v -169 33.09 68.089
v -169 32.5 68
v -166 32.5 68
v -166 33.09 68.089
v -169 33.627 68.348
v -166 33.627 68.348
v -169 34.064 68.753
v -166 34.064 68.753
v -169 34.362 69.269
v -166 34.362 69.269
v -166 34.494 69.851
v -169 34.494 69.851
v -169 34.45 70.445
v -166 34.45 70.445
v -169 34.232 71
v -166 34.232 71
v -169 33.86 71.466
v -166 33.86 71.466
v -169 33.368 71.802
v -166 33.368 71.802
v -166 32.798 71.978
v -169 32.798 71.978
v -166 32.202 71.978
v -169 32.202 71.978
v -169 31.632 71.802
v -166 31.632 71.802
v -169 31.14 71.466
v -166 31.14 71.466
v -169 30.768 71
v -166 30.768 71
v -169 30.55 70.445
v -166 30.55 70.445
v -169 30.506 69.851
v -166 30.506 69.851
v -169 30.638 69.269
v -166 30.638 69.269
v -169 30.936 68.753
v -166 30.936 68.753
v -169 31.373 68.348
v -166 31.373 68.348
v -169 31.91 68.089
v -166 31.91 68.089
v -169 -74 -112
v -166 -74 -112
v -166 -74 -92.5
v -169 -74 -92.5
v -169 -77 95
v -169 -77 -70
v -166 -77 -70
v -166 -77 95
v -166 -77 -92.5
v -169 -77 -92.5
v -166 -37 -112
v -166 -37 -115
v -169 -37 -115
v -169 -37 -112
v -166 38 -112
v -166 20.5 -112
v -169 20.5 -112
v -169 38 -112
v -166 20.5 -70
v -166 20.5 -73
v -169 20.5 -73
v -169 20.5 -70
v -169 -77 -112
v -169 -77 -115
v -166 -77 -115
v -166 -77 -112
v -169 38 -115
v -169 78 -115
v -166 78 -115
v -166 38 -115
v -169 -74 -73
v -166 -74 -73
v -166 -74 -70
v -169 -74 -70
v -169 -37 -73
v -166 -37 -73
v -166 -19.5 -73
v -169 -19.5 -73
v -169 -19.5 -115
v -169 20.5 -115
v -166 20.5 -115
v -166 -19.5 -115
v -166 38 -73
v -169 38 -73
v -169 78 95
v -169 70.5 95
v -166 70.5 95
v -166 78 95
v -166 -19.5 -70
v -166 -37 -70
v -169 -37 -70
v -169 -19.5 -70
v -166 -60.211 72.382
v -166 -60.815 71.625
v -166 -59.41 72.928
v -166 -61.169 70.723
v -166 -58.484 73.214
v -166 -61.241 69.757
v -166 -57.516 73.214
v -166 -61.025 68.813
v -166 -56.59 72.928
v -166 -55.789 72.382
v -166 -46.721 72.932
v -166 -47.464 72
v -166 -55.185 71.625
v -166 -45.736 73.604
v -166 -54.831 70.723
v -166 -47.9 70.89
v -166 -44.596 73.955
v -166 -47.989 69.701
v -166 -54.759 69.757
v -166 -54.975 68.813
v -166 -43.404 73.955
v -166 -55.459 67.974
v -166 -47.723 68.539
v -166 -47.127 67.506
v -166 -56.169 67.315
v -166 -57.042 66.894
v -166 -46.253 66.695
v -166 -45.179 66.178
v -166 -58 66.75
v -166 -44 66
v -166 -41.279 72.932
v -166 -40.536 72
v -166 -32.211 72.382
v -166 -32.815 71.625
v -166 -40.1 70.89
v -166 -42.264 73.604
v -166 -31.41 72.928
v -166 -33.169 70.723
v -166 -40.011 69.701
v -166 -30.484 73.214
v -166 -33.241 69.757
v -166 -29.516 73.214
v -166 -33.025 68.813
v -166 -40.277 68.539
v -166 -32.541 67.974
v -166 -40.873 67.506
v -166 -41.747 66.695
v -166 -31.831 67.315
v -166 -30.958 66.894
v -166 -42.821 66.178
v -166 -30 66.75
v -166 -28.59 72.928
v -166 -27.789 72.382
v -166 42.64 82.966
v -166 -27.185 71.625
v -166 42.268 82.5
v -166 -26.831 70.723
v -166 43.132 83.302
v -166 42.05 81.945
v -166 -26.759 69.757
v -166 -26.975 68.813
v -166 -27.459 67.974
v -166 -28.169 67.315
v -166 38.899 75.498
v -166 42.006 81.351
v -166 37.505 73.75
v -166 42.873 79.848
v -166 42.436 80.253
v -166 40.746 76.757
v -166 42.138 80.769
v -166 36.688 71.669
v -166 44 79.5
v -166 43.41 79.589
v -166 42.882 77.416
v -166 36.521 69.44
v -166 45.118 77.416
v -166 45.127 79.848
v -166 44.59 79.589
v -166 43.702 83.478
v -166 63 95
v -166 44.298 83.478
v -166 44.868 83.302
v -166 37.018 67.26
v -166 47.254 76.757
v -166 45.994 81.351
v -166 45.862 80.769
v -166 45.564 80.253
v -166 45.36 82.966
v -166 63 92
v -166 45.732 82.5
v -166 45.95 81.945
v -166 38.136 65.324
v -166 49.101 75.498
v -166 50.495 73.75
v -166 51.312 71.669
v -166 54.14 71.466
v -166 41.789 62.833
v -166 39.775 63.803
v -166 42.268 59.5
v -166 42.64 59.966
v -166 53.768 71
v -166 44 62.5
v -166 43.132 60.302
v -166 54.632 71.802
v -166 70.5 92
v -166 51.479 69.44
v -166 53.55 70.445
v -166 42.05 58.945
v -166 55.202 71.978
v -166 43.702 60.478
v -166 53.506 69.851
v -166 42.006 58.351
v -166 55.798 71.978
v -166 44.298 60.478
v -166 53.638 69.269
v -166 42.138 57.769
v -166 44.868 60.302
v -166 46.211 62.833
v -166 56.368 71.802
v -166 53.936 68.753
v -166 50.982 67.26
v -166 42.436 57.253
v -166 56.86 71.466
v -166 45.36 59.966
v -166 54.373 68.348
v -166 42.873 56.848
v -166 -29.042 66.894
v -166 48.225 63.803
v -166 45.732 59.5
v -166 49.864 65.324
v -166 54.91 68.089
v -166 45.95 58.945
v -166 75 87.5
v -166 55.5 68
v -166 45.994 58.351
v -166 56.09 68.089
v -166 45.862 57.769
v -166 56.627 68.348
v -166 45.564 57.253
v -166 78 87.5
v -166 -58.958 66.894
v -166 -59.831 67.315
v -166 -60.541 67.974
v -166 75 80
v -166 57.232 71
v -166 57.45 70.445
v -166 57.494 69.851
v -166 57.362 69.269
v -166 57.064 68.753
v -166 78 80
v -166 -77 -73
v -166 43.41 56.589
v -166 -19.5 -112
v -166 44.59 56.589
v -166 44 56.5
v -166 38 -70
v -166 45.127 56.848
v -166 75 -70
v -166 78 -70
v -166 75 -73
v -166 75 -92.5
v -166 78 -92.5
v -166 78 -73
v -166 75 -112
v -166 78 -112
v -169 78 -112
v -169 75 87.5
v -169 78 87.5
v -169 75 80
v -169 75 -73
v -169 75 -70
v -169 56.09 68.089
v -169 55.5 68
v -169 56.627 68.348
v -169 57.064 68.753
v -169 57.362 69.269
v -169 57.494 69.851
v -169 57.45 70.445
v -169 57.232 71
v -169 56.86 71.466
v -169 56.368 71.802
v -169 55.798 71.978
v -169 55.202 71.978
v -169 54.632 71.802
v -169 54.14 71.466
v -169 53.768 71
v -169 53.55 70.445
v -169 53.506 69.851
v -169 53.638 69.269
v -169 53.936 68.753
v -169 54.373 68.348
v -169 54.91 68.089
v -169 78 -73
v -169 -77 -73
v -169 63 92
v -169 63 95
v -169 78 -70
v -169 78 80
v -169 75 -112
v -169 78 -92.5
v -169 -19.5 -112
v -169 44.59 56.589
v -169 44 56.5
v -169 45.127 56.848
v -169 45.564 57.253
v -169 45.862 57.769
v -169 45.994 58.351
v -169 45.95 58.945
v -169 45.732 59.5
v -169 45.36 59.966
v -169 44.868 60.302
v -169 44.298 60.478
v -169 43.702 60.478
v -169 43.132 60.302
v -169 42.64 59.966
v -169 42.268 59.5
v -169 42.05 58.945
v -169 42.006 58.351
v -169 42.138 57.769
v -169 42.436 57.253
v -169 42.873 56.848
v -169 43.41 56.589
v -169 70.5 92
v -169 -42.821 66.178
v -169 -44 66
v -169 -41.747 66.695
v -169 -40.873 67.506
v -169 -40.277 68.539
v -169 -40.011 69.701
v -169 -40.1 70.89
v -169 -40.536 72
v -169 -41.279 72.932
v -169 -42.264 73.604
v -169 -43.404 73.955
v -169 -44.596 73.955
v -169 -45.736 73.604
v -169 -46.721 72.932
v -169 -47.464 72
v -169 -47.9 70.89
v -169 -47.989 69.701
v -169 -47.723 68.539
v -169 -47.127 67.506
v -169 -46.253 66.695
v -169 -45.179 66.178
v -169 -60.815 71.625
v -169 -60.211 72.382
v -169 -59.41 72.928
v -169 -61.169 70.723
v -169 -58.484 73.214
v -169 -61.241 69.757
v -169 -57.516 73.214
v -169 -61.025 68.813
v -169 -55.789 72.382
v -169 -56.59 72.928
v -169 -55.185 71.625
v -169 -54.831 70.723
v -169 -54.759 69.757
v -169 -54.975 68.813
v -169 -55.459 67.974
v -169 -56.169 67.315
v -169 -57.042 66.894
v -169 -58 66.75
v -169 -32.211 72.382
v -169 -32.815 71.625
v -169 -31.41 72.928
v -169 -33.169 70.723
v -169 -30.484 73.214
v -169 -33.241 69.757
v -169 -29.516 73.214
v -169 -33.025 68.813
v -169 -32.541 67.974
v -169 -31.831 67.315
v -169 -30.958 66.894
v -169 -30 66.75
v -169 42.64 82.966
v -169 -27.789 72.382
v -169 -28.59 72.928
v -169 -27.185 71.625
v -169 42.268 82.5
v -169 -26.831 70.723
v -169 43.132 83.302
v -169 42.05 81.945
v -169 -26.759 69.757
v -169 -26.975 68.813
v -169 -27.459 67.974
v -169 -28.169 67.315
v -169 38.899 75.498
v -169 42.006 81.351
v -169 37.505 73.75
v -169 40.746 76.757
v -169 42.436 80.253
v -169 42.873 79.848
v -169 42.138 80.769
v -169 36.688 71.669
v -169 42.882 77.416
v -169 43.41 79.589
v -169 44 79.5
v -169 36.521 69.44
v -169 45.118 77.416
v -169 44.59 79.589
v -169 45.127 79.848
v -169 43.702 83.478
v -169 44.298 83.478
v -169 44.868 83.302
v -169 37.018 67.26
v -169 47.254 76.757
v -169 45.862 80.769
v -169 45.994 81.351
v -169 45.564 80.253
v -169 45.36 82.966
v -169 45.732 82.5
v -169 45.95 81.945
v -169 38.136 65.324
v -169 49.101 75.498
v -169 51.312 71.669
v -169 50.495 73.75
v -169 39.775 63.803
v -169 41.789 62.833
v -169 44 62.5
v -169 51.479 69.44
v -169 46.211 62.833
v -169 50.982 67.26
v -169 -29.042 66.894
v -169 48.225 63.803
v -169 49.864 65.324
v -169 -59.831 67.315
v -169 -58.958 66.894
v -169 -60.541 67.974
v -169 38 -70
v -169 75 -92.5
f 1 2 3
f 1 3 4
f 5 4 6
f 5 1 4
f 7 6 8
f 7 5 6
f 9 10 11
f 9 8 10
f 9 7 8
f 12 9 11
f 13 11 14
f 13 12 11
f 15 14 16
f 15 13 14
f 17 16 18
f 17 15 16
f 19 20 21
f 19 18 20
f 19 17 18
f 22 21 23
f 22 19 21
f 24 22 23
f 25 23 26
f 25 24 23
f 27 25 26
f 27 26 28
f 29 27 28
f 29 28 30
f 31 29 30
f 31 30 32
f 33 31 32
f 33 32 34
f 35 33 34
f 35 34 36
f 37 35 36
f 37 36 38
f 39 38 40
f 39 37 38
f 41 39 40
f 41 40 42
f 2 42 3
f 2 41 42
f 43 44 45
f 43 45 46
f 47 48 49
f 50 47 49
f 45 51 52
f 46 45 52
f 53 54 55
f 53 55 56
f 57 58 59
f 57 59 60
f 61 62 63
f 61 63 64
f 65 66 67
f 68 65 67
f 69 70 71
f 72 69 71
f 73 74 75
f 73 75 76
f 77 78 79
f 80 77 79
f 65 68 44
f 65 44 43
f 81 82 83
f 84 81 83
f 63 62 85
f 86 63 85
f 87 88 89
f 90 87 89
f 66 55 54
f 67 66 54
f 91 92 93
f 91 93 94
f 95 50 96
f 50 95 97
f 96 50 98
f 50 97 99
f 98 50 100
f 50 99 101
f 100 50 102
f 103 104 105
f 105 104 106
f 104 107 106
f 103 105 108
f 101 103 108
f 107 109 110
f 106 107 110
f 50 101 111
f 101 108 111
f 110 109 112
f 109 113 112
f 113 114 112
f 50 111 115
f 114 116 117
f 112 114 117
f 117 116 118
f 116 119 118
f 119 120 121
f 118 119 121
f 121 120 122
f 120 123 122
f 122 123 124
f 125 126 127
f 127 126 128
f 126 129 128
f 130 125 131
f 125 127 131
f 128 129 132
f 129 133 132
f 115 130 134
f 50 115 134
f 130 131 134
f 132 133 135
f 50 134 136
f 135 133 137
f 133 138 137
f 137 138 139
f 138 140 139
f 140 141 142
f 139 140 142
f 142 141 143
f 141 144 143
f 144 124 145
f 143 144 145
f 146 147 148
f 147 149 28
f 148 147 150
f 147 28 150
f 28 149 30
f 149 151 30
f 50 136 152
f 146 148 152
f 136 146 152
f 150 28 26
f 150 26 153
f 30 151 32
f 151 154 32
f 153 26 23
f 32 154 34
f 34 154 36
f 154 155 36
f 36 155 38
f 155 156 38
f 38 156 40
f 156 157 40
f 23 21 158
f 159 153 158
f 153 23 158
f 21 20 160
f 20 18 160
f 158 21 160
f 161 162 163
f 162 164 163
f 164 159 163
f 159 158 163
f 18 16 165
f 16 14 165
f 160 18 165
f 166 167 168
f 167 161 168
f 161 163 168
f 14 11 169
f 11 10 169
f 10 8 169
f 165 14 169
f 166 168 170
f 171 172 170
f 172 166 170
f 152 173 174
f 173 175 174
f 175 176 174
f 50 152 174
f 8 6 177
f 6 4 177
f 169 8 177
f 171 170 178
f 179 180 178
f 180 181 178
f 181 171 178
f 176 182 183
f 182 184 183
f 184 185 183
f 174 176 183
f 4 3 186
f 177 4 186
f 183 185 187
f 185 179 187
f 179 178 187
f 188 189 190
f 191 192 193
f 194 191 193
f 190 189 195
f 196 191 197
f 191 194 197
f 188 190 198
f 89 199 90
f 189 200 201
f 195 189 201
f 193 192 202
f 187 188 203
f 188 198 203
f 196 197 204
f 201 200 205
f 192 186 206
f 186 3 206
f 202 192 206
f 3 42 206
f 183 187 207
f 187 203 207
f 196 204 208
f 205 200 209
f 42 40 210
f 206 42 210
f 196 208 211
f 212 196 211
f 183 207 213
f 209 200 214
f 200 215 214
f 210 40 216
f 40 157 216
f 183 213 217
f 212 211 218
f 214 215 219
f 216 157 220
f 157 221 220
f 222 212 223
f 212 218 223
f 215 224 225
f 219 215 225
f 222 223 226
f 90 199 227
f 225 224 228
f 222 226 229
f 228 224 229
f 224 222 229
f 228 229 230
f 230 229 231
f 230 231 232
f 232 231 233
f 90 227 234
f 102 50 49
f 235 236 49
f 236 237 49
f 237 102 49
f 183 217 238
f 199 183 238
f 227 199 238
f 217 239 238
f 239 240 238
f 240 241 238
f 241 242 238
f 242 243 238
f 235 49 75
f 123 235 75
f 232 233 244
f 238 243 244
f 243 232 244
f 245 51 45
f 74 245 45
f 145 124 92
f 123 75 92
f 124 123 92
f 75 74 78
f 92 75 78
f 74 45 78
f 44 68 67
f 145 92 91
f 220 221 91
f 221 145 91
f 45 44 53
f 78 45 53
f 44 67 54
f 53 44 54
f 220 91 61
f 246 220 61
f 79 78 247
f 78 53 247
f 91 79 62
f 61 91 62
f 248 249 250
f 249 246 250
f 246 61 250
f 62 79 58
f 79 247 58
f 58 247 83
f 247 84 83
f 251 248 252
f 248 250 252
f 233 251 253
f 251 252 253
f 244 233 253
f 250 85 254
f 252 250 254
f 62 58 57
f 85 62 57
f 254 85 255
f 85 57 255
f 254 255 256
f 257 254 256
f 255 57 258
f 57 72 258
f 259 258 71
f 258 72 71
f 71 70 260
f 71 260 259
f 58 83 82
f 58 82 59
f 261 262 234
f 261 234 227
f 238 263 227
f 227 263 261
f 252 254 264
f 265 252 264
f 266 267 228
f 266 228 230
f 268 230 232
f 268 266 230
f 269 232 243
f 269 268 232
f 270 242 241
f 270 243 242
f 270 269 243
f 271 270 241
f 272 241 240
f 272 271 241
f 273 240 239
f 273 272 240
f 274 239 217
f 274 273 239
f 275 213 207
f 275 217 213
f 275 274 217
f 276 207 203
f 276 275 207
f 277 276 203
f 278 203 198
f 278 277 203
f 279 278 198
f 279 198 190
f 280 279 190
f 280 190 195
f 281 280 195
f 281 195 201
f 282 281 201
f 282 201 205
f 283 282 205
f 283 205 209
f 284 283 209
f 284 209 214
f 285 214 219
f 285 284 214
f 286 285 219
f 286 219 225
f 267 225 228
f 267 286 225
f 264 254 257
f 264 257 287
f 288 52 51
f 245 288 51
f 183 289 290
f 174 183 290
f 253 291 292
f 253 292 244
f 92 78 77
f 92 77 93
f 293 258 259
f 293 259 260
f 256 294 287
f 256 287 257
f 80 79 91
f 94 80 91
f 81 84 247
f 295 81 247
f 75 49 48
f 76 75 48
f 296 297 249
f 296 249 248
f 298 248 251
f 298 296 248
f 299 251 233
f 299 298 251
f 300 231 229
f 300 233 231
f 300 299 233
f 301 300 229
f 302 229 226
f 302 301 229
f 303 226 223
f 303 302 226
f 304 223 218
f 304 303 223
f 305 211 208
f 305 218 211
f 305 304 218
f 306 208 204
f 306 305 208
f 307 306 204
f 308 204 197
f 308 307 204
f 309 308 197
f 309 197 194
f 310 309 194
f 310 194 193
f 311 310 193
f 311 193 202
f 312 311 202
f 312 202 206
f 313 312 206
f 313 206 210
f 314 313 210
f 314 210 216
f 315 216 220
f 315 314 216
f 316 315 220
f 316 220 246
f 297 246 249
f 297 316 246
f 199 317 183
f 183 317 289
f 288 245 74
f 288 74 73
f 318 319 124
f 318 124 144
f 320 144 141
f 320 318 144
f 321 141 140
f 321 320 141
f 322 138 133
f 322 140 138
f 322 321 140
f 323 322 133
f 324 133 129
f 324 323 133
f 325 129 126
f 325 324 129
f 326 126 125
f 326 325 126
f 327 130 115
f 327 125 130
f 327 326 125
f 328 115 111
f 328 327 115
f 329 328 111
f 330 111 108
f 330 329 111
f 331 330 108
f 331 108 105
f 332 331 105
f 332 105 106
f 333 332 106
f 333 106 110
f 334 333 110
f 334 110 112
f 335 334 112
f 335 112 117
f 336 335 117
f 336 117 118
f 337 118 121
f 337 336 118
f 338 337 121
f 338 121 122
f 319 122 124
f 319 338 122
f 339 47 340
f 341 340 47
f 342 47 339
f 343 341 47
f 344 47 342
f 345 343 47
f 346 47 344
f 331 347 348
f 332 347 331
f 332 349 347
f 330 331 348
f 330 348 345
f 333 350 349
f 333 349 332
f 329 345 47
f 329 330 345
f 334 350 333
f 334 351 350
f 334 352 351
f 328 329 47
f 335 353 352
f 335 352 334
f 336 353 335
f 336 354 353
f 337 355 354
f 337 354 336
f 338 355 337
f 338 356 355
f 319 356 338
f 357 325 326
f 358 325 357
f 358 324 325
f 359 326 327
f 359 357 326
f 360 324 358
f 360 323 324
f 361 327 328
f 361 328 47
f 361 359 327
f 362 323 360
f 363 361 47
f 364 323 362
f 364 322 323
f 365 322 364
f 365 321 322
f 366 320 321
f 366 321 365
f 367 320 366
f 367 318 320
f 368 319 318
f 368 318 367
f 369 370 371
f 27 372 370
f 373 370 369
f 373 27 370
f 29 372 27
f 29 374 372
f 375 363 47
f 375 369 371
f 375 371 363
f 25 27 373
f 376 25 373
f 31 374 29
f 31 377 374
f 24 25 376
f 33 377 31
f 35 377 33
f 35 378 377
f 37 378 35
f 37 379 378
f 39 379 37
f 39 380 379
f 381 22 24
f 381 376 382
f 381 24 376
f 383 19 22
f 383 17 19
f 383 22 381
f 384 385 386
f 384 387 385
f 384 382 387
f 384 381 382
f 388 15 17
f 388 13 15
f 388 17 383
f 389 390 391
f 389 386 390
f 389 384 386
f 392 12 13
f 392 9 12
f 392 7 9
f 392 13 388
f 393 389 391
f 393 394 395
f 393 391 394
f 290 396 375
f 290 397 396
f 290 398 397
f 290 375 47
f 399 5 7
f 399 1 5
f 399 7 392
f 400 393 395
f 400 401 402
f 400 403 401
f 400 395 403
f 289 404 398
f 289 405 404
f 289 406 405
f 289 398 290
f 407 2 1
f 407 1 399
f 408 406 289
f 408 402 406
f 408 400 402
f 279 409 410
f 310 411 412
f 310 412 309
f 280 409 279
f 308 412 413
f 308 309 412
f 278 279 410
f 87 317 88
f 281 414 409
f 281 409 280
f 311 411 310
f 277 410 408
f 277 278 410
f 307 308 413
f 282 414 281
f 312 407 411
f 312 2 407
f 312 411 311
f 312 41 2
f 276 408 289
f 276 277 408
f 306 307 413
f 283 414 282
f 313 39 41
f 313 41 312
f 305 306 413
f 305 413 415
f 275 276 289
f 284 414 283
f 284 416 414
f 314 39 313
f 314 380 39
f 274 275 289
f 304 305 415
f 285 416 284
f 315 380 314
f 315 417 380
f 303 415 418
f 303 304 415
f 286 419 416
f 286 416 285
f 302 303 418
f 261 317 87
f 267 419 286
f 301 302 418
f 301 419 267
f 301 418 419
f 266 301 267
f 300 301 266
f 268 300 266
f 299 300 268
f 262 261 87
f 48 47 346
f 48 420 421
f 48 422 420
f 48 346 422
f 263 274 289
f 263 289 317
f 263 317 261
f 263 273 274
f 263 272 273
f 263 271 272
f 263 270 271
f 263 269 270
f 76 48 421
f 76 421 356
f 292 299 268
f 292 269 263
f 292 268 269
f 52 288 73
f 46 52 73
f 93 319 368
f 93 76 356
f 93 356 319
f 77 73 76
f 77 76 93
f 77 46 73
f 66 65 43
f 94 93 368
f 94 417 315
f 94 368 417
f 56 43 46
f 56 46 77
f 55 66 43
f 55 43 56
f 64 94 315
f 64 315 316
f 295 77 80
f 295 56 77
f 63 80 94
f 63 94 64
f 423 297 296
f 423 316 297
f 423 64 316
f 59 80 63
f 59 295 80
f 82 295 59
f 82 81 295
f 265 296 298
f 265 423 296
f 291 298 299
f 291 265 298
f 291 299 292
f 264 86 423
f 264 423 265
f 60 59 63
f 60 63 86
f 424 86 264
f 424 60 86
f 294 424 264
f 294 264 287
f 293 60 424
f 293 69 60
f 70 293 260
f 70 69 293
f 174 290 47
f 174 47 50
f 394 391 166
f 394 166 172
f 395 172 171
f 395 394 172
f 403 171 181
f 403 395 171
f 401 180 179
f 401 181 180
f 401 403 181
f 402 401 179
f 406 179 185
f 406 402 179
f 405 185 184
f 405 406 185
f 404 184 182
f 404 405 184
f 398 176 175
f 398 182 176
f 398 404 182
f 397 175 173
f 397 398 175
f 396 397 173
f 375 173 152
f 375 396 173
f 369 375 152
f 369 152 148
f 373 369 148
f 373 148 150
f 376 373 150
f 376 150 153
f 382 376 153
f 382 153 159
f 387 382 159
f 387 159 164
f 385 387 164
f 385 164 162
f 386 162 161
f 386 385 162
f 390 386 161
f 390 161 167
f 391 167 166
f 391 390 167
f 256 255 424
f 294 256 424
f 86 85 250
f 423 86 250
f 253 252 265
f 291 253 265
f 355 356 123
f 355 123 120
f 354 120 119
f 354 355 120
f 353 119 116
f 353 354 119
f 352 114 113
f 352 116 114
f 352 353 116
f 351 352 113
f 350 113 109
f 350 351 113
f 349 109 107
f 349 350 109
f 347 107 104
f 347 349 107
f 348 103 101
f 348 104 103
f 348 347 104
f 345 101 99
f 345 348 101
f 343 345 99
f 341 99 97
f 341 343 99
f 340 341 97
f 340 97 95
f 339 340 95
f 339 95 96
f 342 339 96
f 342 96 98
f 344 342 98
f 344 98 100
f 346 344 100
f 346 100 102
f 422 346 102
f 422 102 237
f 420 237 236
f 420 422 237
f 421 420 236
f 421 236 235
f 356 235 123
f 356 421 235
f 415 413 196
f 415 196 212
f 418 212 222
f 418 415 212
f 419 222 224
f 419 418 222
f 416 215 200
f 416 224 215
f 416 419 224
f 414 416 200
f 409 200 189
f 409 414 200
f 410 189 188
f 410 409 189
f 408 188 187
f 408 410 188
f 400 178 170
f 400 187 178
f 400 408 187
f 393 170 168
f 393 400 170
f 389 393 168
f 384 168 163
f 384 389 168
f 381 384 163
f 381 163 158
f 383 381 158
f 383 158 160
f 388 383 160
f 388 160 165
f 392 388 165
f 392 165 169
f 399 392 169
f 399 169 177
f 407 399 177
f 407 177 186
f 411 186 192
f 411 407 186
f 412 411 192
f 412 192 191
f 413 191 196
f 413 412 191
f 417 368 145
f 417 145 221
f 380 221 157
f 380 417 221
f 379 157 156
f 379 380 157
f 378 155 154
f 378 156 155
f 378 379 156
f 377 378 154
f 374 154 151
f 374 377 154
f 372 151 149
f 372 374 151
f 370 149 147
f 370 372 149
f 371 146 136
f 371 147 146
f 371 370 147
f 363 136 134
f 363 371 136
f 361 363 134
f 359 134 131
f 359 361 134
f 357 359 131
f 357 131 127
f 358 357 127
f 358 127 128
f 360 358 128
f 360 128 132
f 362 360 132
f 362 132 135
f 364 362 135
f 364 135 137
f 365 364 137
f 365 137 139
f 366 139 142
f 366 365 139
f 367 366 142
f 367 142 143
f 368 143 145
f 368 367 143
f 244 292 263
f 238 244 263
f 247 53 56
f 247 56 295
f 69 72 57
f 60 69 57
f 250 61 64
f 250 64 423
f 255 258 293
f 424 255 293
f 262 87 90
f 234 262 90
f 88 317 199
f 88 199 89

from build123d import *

# Parameters (mm, degrees)
CYLINDER128_R                                = 2
CYLINDER128_DEPTH                            = 10
CYLINDER128_PITCH_ANGLE                      = 90
CYLINDER131_R                                = 2
CYLINDER131_DEPTH                            = 10
CYLINDER131_PITCH_ANGLE                      = 90
CYLINDER130_R                                = 2
CYLINDER130_DEPTH                            = 10
CYLINDER130_PITCH_ANGLE                      = 90
CYLINDER129_R                                = 2
CYLINDER129_DEPTH                            = 10
CYLINDER129_PITCH_ANGLE                      = 90
CYLINDER127_R                                = 7.5
CYLINDER127_DEPTH                            = 10
CYLINDER127_PITCH_ANGLE                      = 90
CYLINDER125_R                                = 3.25
CYLINDER125_DEPTH                            = 10
CYLINDER125_PITCH_ANGLE                      = 90
CYLINDER126_R                                = 3.25
CYLINDER126_DEPTH                            = 10
CYLINDER126_PITCH_ANGLE                      = 90
CYLINDER124_R                                = 4
CYLINDER124_DEPTH                            = 10
CYLINDER124_PITCH_ANGLE                      = 90
RECTANGLE159_W                               = 7.5
RECTANGLE159_H                               = 3
EXTRUDE205_DEPTH                             = 3
RECTANGLE155_W                               = 3
RECTANGLE155_H                               = 7.5
EXTRUDE204_DEPTH                             = 3
RECTANGLE140_W                               = 17.5
RECTANGLE140_H                               = 3
EXTRUDE181_DEPTH                             = 3
RECTANGLE142_W                               = 17.5
RECTANGLE142_H                               = 3
EXTRUDE183_DEPTH                             = 3
RECTANGLE141_W                               = 17.5
RECTANGLE141_H                               = 3
EXTRUDE182_DEPTH                             = 3
RECTANGLE139_W                               = 17.5
RECTANGLE139_H                               = 3
EXTRUDE180_DEPTH                             = 3
RECTANGLE129_AS_DRAWN_W                      = 25
RECTANGLE129_AS_DRAWN_H                      = 3
EXTRUDE172_DEPTH                             = 3
EXTRUDE172_ONTO_RECTANGLE129_ROLL_ANGLE      = -90
EXTRUDE172_ONTO_RECTANGLE129_PLACEMENT_ANGLE = 180
RECTANGLE132_AS_DRAWN_W                      = 3
RECTANGLE132_AS_DRAWN_H                      = 19.5
EXTRUDE169_DEPTH                             = 3
EXTRUDE169_ONTO_RECTANGLE132_ROLL_ANGLE      = -90
EXTRUDE169_ONTO_RECTANGLE132_PLACEMENT_ANGLE = 180
BOX012_W                                     = 3
BOX012_H                                     = 155
BOX012_DEPTH                                 = 210


with BuildPart() as cylinder159:
    # Cylinder128 → Cylinder128 (new body)
    with BuildSketch(Plane.XY):
        Circle(CYLINDER128_R)
    extrude(amount=CYLINDER128_DEPTH)


with BuildPart() as cylinder159_1:
    # Cylinder128 pitch: moved
    add(cylinder159.part.rotate(Axis((0, 0, 0), (0, 1, 0)), CYLINDER128_PITCH_ANGLE))


with BuildPart() as cylinder159_2:
    # Cylinder128 placement: moved
    add(cylinder159_1.part.moved(Location((-173, 44, 81.5))))


with BuildPart() as cylinder162:
    # Cylinder131 → Cylinder131 (new body)
    with BuildSketch(Plane.XY):
        Circle(CYLINDER131_R)
    extrude(amount=CYLINDER131_DEPTH)


with BuildPart() as cylinder162_1:
    # Cylinder131 pitch: moved
    add(cylinder162.part.rotate(Axis((0, 0, 0), (0, 1, 0)), CYLINDER131_PITCH_ANGLE))


with BuildPart() as cylinder162_2:
    # Cylinder131 placement: moved
    add(cylinder162_1.part.moved(Location((-173, 32.5, 70))))


with BuildPart() as cylinder161:
    # Cylinder130 → Cylinder130 (new body)
    with BuildSketch(Plane.XY):
        Circle(CYLINDER130_R)
    extrude(amount=CYLINDER130_DEPTH)


with BuildPart() as cylinder161_1:
    # Cylinder130 pitch: moved
    add(cylinder161.part.rotate(Axis((0, 0, 0), (0, 1, 0)), CYLINDER130_PITCH_ANGLE))


with BuildPart() as cylinder161_2:
    # Cylinder130 placement: moved
    add(cylinder161_1.part.moved(Location((-173, 55.5, 70))))


with BuildPart() as cylinder160:
    # Cylinder129 → Cylinder129 (new body)
    with BuildSketch(Plane.XY):
        Circle(CYLINDER129_R)
    extrude(amount=CYLINDER129_DEPTH)


with BuildPart() as cylinder160_1:
    # Cylinder129 pitch: moved
    add(cylinder160.part.rotate(Axis((0, 0, 0), (0, 1, 0)), CYLINDER129_PITCH_ANGLE))


with BuildPart() as cylinder160_2:
    # Cylinder129 placement: moved
    add(cylinder160_1.part.moved(Location((-173, 44, 58.5))))


with BuildPart() as fusion064062:
    # Cylinder127 → Cylinder127 (new body)
    with BuildSketch(Plane.XY):
        Circle(CYLINDER127_R)
    extrude(amount=CYLINDER127_DEPTH)


with BuildPart() as fusion064062_1:
    # Cylinder127 pitch: moved
    add(fusion064062.part.rotate(Axis((0, 0, 0), (0, 1, 0)), CYLINDER127_PITCH_ANGLE))


with BuildPart() as fusion064062_2:
    # Cylinder127 placement: moved
    add(fusion064062_1.part.moved(Location((-175, 44, 70))))

    # Fusion064062: union Cylinder159, Cylinder162, Cylinder161, Cylinder160
    add(cylinder159_2.part)
    add(cylinder162_2.part)
    add(cylinder161_2.part)
    add(cylinder160_2.part)


with BuildPart() as cylinder156:
    # Cylinder125 → Cylinder125 (new body)
    with BuildSketch(Plane.XY):
        Circle(CYLINDER125_R)
    extrude(amount=CYLINDER125_DEPTH)


with BuildPart() as cylinder156_1:
    # Cylinder125 pitch: moved
    add(cylinder156.part.rotate(Axis((0, 0, 0), (0, 1, 0)), CYLINDER125_PITCH_ANGLE))


with BuildPart() as cylinder156_2:
    # Cylinder125 placement: moved
    add(cylinder156_1.part.moved(Location((-172, -30, 70))))


with BuildPart() as cylinder157:
    # Cylinder126 → Cylinder126 (new body)
    with BuildSketch(Plane.XY):
        Circle(CYLINDER126_R)
    extrude(amount=CYLINDER126_DEPTH)


with BuildPart() as cylinder157_1:
    # Cylinder126 pitch: moved
    add(cylinder157.part.rotate(Axis((0, 0, 0), (0, 1, 0)), CYLINDER126_PITCH_ANGLE))


with BuildPart() as cylinder157_2:
    # Cylinder126 placement: moved
    add(cylinder157_1.part.moved(Location((-172, -58, 70))))


with BuildPart() as fusion064063:
    # Cylinder124 → Cylinder124 (new body)
    with BuildSketch(Plane.XY):
        Circle(CYLINDER124_R)
    extrude(amount=CYLINDER124_DEPTH)


with BuildPart() as fusion064063_1:
    # Cylinder124 pitch: moved
    add(fusion064063.part.rotate(Axis((0, 0, 0), (0, 1, 0)), CYLINDER124_PITCH_ANGLE))


with BuildPart() as fusion064063_2:
    # Cylinder124 placement: moved
    add(fusion064063_1.part.moved(Location((-173, -44, 70))))

    # Fusion064060: union Cylinder156, Cylinder157
    add(cylinder156_2.part)
    add(cylinder157_2.part)

    # Fusion064063: union Fusion064062
    add(fusion064062_2.part)


with BuildPart() as extrude205:
    # Rectangle159 → Extrude205 (new body)
    with BuildSketch(Plane(origin=(-169, 70.5, 95), x_dir=(0, -1, 0), z_dir=(-1, 0, 0))):
        with Locations((3.75, -1.5)):
            Rectangle(RECTANGLE159_W, RECTANGLE159_H)
    extrude(amount=-EXTRUDE205_DEPTH)


with BuildPart() as fusion064057:
    # Rectangle155 → Extrude204 (new body)
    with BuildSketch(Plane(origin=(-169, 75, 80), x_dir=(0, -1, 0), z_dir=(-1, 0, 0))):
        with Locations((-1.5, 3.75)):
            Rectangle(RECTANGLE155_W, RECTANGLE155_H)
    extrude(amount=-EXTRUDE204_DEPTH)

    # Fusion064057: union Extrude205
    add(extrude205.part)


with BuildPart() as extrude181:
    # Rectangle140 → Extrude181 (new body)
    with BuildSketch(Plane(origin=(114, 20.5, -70), x_dir=(0, 1, 0), z_dir=(1, 0, 0))):
        with Locations((8.75, -1.5)):
            Rectangle(RECTANGLE140_W, RECTANGLE140_H)
    extrude(amount=-EXTRUDE181_DEPTH)


with BuildPart() as extrude183:
    # Rectangle142 → Extrude183 (new body)
    with BuildSketch(Plane(origin=(114, -37, -112), x_dir=(0, 1, 0), z_dir=(1, 0, 0))):
        with Locations((8.75, -1.5)):
            Rectangle(RECTANGLE142_W, RECTANGLE142_H)
    extrude(amount=-EXTRUDE183_DEPTH)


with BuildPart() as extrude182:
    # Rectangle141 → Extrude182 (new body)
    with BuildSketch(Plane(origin=(114, 20.5, -112), x_dir=(0, 1, 0), z_dir=(1, 0, 0))):
        with Locations((8.75, -1.5)):
            Rectangle(RECTANGLE141_W, RECTANGLE141_H)
    extrude(amount=-EXTRUDE182_DEPTH)


with BuildPart() as fusion064045:
    # Rectangle139 → Extrude180 (new body)
    with BuildSketch(Plane(origin=(114, -37, -70), x_dir=(0, 1, 0), z_dir=(1, 0, 0))):
        with Locations((8.75, -1.5)):
            Rectangle(RECTANGLE139_W, RECTANGLE139_H)
    extrude(amount=-EXTRUDE180_DEPTH)

    # Fusion064045: union Extrude181, Extrude183, Extrude182
    add(extrude181.part)
    add(extrude183.part)
    add(extrude182.part)


with BuildPart() as fusion064045_1:
    # Fusion064045 placement: moved
    add(fusion064045.part.moved(Location((-280, 0, 0))))


with BuildPart() as extrude172:
    # Rectangle129 as drawn → Extrude172 (new)
    with BuildSketch(Plane.XY):
        with Locations((12.5, 1.5)):
            Rectangle(RECTANGLE129_AS_DRAWN_W, RECTANGLE129_AS_DRAWN_H)
    extrude(amount=-EXTRUDE172_DEPTH)


with BuildPart() as extrude172_1:
    # Extrude172 onto Rectangle129 roll: moved
    add(extrude172.part.rotate(Axis((0, 0, 0), (1, 0, 0)), EXTRUDE172_ONTO_RECTANGLE129_ROLL_ANGLE))


with BuildPart() as extrude172_2:
    # Extrude172 onto Rectangle129 placement: moved
    add(extrude172_1.part.moved(Location((64, -77, -70))).rotate(Axis((64, -77, -70), (0, 0, 1)), EXTRUDE172_ONTO_RECTANGLE129_PLACEMENT_ANGLE))


with BuildPart() as extrude172_3:
    # Extrude172 placement: moved
    add(extrude172_2.part.moved(Location((-208, 0, 0))))


with BuildPart() as extrude169:
    # Rectangle132 as drawn → Extrude169 (new)
    with BuildSketch(Plane.XY):
        with Locations((1.5, 9.75)):
            Rectangle(RECTANGLE132_AS_DRAWN_W, RECTANGLE132_AS_DRAWN_H)
    extrude(amount=-EXTRUDE169_DEPTH)


with BuildPart() as extrude169_1:
    # Extrude169 onto Rectangle132 roll: moved
    add(extrude169.part.rotate(Axis((0, 0, 0), (1, 0, 0)), EXTRUDE169_ONTO_RECTANGLE132_ROLL_ANGLE))


with BuildPart() as extrude169_2:
    # Extrude169 onto Rectangle132 placement: moved
    add(extrude169_1.part.moved(Location((114, -77, -92.5))).rotate(Axis((114, -77, -92.5), (0, 0, 1)), EXTRUDE169_ONTO_RECTANGLE132_PLACEMENT_ANGLE))


with BuildPart() as extrude169_3:
    # Extrude169 placement: moved
    add(extrude169_2.part.moved(Location((-280, 0, 0))))


with BuildPart() as fusion064037:
    # Fusion064037 base: copy of Extrude169
    add(extrude169_3.part)

    # Fusion064037: union Extrude172
    add(extrude172_3.part)


with BuildPart() as fusion064037_1:
    # Fusion064037 placement: moved
    add(fusion064037.part.moved(Location((0, 152, 0))))


with BuildPart() as fusion064031:
    # Fusion064031 base: copy of Extrude169
    add(extrude169_3.part)

    # Fusion064031: union Extrude172
    add(extrude172_3.part)


with BuildPart() as cut035053:
    # Box012 → Box012 (new body)
    with BuildSketch(Plane(origin=(-169, -77, -115), x_dir=(1, 0, 0), z_dir=(0, 0, 1))):
        with Locations((1.5, 77.5)):
            Rectangle(BOX012_W, BOX012_H)
    extrude(amount=BOX012_DEPTH)

    # Cut035021: cut Fusion064031
    add(fusion064031.part, mode=Mode.SUBTRACT)

    # Cut035024: cut Fusion064037
    add(fusion064037_1.part, mode=Mode.SUBTRACT)

    # Cut035032: cut Fusion064045
    add(fusion064045_1.part, mode=Mode.SUBTRACT)

    # Cut035042: cut Fusion064057
    add(fusion064057.part, mode=Mode.SUBTRACT)

    # Cut035053: cut Fusion064063
    add(fusion064063_2.part, mode=Mode.SUBTRACT)


solid = cut035053.part
